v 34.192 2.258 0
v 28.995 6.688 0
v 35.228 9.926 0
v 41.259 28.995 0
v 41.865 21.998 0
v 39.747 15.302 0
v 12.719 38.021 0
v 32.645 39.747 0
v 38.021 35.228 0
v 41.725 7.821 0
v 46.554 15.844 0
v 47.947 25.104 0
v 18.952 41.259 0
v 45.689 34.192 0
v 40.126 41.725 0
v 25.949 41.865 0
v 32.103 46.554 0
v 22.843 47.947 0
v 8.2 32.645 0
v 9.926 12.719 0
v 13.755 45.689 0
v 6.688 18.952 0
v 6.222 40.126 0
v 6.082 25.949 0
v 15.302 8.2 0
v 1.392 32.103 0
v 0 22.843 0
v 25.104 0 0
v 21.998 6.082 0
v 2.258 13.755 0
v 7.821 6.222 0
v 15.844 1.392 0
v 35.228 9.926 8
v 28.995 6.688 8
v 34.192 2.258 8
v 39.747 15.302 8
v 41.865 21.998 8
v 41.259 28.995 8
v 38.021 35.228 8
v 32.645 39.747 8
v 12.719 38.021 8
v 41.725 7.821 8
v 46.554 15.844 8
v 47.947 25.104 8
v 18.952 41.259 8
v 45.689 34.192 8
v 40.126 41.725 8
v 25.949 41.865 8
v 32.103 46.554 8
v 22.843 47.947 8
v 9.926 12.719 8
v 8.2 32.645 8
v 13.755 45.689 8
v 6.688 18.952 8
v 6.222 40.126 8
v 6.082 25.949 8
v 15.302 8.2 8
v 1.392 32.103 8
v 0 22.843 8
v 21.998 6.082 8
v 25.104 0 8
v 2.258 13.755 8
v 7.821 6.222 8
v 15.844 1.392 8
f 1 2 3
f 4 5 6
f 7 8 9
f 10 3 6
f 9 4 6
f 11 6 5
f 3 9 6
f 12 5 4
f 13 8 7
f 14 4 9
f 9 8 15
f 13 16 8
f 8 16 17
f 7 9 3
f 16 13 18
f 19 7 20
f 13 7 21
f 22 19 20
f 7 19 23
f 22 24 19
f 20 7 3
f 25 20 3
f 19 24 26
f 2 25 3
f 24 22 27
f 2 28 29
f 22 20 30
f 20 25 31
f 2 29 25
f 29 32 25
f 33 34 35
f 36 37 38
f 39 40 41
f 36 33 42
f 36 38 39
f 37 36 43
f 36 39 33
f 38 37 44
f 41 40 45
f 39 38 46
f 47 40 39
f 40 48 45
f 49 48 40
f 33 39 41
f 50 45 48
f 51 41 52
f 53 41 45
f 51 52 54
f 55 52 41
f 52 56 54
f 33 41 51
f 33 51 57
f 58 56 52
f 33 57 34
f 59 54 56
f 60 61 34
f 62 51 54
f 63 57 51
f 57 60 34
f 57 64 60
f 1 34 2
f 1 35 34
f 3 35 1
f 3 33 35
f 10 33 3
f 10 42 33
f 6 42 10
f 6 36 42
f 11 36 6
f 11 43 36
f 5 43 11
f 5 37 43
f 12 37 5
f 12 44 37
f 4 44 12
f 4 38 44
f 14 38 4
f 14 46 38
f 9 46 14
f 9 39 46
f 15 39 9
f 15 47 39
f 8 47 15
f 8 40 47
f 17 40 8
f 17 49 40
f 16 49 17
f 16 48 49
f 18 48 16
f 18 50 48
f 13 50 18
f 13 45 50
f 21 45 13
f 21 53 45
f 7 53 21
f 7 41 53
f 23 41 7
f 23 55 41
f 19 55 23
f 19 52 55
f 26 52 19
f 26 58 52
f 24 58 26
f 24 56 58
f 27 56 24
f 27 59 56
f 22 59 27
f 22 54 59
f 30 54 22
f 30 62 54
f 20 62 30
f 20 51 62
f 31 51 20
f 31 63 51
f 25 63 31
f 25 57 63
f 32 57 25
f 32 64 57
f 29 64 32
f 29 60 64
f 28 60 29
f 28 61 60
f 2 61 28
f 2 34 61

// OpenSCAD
$fn = 32;

// ----------------------------------------------------------------------
// Chain sprocket: 16 teeth, 18 mm root radius
// ----------------------------------------------------------------------

// --- parameters (mm) ---
profile_height = 8;       // extrusion height
profile_points = 32;      // points of the closed outline

profile = [[41.865, 21.998], [47.947, 25.104], [41.259, 28.995], [45.689, 34.192], [38.021, 35.228], [40.126, 41.725], [32.645, 39.747], [32.103, 46.554], [25.949, 41.865], [22.843, 47.947], [18.952, 41.259], [13.755, 45.689], [12.719, 38.021], [6.222, 40.126], [8.2, 32.645], [1.392, 32.103], [6.082, 25.949], [0, 22.843], [6.688, 18.952], [2.258, 13.755], [9.926, 12.719], [7.821, 6.222], [15.302, 8.2], [15.844, 1.392], [21.998, 6.082], [25.104, 0], [28.995, 6.688], [34.192, 2.258], [35.228, 9.926], [41.725, 7.821], [39.747, 15.302], [46.554, 15.844]];  // single closed polygon, 32 points, counter clockwise

// --- the one profile operation ---
linear_extrude(height = profile_height) polygon(points = profile);
